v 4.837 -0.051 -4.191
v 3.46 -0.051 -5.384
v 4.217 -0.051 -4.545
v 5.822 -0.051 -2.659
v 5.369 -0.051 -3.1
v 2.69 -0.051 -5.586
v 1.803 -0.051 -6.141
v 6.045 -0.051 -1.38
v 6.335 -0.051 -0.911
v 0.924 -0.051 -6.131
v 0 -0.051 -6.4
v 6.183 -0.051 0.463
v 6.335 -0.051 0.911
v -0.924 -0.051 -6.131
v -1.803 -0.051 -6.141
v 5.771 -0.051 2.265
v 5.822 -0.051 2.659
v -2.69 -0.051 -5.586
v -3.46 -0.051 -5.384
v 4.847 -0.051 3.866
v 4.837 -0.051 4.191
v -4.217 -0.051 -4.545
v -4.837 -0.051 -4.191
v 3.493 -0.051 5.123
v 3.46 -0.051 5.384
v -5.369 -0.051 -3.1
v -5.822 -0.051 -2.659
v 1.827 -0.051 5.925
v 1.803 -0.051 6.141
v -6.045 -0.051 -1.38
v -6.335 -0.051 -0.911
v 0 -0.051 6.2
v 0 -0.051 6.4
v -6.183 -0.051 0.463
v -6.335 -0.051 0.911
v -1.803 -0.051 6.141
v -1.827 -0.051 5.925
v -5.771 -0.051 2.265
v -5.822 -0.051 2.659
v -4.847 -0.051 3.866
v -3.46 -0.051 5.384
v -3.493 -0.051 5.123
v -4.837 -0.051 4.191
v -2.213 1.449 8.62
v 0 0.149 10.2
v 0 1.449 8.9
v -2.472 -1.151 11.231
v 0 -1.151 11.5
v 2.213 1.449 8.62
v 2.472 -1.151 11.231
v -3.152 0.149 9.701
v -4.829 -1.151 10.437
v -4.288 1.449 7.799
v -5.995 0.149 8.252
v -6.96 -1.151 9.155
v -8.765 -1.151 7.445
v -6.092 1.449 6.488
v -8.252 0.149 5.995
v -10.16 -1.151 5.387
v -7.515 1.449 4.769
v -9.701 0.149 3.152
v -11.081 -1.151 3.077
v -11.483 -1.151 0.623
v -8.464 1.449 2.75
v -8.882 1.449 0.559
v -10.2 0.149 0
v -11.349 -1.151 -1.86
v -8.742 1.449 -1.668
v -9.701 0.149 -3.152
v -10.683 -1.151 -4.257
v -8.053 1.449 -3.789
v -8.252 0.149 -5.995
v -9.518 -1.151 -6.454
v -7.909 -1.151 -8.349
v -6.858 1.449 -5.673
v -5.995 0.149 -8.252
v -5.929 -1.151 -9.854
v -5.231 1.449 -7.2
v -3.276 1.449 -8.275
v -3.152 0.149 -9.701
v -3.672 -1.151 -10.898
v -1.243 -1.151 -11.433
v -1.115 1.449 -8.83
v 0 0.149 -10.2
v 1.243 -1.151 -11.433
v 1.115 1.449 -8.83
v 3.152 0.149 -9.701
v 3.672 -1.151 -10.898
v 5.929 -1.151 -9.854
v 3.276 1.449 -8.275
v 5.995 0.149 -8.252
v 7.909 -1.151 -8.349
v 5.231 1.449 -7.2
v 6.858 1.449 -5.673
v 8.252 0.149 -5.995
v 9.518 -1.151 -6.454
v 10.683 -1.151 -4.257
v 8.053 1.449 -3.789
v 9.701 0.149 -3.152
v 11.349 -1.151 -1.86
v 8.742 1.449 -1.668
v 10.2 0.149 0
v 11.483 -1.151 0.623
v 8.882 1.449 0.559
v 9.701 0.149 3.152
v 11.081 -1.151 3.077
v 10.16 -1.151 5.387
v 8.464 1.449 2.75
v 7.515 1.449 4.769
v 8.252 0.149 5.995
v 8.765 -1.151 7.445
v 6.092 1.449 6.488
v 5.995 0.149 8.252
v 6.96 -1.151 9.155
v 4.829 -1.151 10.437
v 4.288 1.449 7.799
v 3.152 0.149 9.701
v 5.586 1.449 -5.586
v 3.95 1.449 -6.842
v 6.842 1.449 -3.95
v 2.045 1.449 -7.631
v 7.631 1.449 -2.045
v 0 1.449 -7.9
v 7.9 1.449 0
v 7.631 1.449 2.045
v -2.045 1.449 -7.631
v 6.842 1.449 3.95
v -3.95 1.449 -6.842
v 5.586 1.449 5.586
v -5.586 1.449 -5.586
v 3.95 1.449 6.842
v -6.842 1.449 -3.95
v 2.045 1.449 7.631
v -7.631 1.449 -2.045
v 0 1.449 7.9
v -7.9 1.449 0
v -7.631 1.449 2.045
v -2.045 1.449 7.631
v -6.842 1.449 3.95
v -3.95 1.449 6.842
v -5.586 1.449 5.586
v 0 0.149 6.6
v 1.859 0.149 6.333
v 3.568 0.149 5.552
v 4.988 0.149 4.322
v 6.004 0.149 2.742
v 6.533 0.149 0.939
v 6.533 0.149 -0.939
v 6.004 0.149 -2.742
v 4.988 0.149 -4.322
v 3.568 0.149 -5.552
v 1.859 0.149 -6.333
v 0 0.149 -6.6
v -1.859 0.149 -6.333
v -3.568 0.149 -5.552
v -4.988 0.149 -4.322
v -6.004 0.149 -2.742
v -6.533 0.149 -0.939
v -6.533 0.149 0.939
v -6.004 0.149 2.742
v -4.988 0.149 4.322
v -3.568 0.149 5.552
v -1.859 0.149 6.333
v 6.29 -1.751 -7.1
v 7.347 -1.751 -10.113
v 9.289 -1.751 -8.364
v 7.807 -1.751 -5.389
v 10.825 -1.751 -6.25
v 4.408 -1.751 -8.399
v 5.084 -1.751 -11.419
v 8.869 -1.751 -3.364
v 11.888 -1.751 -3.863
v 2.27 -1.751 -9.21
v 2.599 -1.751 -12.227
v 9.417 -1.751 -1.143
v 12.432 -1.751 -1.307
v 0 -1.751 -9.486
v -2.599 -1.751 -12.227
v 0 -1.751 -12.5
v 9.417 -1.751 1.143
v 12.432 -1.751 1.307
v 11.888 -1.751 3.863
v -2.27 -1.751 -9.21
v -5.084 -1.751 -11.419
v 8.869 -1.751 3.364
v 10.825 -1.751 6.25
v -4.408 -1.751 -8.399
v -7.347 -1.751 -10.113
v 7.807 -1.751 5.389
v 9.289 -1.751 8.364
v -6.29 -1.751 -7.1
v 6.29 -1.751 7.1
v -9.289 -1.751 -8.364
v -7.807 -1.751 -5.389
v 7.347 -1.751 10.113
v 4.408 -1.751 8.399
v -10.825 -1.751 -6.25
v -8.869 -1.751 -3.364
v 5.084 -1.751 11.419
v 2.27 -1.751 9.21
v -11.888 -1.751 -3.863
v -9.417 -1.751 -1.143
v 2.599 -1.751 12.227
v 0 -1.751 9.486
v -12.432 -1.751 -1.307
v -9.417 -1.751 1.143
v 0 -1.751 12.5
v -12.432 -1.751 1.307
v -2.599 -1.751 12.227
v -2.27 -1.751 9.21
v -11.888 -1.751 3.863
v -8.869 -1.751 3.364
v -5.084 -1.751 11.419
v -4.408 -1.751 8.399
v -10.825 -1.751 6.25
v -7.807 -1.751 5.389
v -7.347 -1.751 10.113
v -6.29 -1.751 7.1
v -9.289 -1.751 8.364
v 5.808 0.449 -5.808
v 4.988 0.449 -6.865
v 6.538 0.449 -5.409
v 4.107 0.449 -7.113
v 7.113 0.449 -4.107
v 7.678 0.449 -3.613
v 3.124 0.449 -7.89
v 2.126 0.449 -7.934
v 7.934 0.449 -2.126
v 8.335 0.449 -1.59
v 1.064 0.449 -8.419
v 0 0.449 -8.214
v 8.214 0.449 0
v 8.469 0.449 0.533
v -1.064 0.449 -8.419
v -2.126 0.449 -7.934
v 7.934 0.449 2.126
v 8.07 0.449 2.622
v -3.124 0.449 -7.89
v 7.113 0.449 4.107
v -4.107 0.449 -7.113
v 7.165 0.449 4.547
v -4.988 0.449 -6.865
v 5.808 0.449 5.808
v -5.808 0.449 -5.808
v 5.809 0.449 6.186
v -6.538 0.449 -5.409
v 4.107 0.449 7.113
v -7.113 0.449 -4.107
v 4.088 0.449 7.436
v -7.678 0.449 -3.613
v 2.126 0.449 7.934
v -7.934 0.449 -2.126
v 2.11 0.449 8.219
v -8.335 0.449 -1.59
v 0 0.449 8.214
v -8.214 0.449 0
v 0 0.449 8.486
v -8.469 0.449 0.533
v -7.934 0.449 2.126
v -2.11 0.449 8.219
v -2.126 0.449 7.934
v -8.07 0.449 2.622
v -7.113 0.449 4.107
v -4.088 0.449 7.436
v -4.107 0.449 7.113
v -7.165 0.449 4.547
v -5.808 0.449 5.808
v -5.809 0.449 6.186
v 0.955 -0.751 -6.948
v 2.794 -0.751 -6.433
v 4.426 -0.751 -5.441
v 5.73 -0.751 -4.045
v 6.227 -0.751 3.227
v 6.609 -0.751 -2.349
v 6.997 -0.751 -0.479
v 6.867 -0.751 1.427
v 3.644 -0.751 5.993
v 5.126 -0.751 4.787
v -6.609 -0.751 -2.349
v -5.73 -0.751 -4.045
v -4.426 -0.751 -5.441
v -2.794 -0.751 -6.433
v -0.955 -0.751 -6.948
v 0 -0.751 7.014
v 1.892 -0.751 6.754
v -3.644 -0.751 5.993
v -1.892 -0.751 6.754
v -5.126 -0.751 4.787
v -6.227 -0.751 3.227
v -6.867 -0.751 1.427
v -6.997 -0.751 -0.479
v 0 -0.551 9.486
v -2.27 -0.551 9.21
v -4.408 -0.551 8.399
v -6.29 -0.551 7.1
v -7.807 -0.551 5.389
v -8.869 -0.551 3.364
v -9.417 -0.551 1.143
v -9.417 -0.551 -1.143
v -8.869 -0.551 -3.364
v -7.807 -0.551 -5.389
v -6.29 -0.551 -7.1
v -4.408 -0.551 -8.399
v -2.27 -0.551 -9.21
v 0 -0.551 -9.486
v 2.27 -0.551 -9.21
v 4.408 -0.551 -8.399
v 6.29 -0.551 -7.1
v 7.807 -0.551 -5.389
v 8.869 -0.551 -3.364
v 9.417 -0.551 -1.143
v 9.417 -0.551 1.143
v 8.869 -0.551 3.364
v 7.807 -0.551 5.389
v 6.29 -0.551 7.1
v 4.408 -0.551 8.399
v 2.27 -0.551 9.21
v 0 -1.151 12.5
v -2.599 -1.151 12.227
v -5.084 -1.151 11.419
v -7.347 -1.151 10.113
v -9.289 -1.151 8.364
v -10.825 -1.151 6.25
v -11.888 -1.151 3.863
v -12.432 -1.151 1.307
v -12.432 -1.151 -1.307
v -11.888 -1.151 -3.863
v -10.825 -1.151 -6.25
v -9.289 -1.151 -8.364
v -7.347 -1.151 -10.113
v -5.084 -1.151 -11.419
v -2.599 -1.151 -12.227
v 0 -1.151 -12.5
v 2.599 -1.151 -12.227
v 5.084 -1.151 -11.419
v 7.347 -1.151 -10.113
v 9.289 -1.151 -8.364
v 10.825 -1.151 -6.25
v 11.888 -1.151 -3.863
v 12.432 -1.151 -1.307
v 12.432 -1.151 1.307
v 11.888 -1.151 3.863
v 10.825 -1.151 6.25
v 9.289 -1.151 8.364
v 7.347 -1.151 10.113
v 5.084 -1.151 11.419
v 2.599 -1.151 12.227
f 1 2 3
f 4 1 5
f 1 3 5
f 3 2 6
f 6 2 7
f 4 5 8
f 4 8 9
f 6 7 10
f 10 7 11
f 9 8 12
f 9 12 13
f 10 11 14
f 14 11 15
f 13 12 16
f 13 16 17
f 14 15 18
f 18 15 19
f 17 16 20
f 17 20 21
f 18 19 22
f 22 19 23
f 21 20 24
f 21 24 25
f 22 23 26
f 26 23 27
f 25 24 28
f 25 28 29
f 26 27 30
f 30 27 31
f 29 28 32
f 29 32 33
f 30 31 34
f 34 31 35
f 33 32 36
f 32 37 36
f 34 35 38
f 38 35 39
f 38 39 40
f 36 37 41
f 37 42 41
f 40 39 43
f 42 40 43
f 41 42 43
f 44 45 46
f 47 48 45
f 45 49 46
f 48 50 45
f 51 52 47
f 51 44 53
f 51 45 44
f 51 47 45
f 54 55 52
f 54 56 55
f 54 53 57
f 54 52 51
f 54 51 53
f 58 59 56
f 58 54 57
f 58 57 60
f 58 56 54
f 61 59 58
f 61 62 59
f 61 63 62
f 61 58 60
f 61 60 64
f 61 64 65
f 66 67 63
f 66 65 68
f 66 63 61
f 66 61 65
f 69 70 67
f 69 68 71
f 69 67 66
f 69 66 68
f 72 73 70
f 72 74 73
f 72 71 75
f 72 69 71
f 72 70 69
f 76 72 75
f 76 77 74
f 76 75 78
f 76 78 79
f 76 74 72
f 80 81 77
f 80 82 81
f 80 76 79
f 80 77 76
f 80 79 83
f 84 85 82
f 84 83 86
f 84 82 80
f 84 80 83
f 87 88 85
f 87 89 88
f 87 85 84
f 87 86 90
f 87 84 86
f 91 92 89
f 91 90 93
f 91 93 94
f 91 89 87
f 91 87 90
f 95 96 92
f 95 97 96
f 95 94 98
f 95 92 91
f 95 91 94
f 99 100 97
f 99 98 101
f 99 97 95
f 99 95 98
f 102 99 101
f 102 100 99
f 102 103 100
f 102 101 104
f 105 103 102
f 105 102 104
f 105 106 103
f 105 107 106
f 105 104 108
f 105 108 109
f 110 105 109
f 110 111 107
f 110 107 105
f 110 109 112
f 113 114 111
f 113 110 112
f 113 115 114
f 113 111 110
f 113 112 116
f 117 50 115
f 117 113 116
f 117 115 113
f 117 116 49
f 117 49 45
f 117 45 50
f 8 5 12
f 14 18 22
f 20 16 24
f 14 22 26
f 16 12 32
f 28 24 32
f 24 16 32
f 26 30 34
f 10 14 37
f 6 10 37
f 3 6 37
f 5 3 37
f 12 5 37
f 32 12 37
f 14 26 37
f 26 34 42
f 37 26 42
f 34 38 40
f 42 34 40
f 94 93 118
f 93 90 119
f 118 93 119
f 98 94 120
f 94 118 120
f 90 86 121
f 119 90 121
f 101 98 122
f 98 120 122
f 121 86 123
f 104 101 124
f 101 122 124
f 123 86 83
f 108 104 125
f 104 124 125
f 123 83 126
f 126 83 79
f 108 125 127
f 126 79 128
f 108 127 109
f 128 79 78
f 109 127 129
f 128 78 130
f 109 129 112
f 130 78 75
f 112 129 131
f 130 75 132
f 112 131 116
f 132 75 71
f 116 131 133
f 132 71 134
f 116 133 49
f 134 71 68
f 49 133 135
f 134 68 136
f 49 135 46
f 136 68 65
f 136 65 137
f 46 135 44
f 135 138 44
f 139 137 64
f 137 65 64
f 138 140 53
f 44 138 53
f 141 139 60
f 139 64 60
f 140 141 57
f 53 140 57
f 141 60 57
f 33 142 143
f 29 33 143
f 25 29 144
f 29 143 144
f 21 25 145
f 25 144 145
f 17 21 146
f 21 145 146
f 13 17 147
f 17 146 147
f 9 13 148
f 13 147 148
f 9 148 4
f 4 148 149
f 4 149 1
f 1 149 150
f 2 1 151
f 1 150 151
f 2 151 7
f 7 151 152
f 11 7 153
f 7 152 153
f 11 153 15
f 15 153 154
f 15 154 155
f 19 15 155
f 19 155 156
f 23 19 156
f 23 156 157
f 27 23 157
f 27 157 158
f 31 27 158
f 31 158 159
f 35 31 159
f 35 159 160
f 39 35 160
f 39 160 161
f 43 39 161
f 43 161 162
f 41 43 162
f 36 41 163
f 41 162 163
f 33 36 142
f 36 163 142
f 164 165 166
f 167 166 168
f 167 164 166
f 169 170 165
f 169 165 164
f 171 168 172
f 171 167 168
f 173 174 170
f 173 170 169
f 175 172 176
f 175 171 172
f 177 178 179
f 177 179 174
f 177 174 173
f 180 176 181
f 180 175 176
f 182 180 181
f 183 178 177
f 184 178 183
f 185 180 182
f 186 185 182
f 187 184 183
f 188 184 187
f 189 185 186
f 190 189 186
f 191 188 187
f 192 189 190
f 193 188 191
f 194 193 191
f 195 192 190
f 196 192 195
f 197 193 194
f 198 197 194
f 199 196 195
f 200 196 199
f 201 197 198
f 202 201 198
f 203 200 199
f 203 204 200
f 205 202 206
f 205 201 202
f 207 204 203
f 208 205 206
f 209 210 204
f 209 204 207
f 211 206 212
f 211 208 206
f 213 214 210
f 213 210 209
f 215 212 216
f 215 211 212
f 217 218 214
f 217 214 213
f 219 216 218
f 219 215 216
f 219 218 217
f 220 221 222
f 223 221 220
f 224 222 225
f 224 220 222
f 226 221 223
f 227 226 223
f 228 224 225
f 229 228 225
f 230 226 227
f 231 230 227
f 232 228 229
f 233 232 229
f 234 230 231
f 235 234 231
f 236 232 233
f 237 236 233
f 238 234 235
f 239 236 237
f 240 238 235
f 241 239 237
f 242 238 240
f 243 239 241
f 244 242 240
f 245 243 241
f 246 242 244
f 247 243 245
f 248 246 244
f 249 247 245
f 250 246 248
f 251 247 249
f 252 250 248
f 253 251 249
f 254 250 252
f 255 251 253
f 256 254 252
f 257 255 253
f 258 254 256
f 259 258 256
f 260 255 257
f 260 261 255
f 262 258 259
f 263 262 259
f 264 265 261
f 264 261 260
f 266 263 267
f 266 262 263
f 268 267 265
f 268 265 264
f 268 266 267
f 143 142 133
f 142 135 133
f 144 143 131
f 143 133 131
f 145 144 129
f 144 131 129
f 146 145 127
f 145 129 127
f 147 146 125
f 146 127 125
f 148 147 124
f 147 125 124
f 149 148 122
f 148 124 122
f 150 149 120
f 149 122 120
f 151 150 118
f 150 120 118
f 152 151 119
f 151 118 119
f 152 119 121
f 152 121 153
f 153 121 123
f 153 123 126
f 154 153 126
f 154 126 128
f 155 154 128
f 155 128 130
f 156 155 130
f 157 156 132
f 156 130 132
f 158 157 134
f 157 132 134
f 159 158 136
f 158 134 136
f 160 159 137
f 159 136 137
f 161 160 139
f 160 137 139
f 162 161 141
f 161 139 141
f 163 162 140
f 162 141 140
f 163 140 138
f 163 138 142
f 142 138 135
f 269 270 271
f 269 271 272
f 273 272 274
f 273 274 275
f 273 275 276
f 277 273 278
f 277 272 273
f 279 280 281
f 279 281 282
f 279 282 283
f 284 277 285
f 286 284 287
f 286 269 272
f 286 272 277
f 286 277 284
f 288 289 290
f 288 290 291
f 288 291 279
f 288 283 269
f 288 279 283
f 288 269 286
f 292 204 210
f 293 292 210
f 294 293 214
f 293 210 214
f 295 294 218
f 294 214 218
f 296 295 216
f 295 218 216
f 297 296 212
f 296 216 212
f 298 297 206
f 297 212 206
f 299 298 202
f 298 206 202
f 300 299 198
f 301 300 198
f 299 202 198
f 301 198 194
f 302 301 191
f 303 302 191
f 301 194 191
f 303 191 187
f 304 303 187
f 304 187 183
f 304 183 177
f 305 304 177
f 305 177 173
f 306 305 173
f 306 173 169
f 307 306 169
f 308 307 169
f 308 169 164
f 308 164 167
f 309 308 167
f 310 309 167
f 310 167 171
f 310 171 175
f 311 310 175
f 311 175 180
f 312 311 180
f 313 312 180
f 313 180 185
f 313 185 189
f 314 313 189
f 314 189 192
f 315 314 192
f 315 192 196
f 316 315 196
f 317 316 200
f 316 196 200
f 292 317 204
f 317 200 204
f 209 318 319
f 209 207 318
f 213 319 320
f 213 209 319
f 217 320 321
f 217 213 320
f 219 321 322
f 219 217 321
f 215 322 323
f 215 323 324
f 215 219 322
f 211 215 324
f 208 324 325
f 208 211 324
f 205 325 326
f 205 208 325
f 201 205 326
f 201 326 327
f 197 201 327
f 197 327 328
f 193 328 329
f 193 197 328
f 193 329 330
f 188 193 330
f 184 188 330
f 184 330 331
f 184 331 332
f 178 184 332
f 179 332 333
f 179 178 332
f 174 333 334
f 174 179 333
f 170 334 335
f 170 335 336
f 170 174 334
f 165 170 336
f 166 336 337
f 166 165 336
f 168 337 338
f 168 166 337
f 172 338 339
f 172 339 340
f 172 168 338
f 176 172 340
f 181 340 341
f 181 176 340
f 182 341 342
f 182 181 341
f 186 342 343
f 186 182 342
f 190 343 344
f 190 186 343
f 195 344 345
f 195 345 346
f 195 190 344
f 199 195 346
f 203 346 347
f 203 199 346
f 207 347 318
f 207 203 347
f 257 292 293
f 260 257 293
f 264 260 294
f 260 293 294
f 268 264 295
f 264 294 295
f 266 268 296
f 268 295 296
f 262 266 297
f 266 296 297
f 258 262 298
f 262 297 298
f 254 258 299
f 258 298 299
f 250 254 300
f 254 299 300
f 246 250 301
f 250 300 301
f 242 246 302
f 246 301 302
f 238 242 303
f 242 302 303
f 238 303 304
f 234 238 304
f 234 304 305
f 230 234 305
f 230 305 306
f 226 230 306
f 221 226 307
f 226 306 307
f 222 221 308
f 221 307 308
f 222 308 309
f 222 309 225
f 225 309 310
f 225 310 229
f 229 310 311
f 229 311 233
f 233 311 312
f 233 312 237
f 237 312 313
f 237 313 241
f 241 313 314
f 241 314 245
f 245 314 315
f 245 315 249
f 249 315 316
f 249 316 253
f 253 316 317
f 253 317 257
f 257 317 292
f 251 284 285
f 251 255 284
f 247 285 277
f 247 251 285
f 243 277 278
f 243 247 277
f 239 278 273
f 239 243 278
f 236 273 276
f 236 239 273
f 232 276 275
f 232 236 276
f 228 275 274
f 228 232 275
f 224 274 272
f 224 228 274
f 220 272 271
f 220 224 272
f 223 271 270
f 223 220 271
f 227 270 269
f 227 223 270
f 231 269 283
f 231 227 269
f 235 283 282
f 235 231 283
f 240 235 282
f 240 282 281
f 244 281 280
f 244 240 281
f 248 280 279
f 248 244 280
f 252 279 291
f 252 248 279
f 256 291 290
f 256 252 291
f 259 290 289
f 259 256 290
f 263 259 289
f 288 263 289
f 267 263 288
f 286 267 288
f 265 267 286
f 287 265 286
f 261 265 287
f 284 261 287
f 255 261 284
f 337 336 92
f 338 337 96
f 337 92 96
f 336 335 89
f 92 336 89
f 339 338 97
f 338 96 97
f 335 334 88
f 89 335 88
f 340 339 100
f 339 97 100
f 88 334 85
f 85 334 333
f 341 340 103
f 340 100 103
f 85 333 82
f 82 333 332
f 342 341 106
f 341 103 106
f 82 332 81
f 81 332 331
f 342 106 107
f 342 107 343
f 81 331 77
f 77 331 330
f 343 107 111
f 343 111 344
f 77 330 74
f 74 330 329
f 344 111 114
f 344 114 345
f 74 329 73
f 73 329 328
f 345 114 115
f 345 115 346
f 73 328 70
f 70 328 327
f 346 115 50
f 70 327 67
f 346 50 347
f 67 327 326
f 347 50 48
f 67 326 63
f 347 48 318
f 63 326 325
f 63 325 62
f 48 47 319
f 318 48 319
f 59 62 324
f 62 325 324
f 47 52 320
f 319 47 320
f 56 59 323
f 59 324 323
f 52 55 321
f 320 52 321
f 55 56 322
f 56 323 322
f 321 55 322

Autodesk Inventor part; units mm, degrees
ref_plane "YZ Plane" through (0, 0, 0) normal (1, 0, 0) x (0, 1, 0)
ref_plane "XZ Plane" through (0, 0, 0) normal (0, 1, 0) x (-1, 0, 0)
ref_plane "XY Plane" through (0, 0, 0) normal (0, 0, 1) x (1, 0, 0)
sketch "Skizze1" plane through (0, 0, 0) normal (1, 0, 0) x (0, 1, 0)
  line L0 (3, 8.0893) -> (5.1212, 8.0893) construction
  line L1 (-0.0509, -6.2) -> (0.0741, -6.2) construction
  line L2 (0.0741, -6.2) -> (0.0741, 6.2) construction
  line L3 (0.0741, 6.2) -> (-0.0509, 6.2) construction
  line L4 (-0.0509, 6.2) -> (-0.0509, -6.2) construction
  line L5 (-0.0509, -6.2) -> (0.0741, 6.2) construction
  line L6 (0.0741, -6.2) -> (-0.0509, 6.2) construction
  line L7 (-0.0509, 6.2) -> (-0.0509, 0)
  line L8 (-0.0509, 0) -> (-0.7509, 0)
  line L9 (-0.7509, 0) -> (-0.7509, 7.0138)
  line L10 (-0.7509, 7.0138) -> (0.4491, 8.2138)
  line L11 (0.4491, 8.2138) -> (0.4491, 8.4858)
  line L12 (-0.0509, 6.2) -> (-0.0509, 6.4)
  line L13 (-0.0509, 6.4) -> (1.4491, 7.9)
  line L14 (1.4491, 7.9) -> (1.4491, 8.9)
  line L15 (1.4491, 8.9) -> (-1.1509, 11.5)
  line L16 (-1.7509, 12.5) -> (-1.7509, 9.4858)
  line L17 (0.4491, 8.4858) -> (-0.5509, 9.4858)
  line L18 (-0.5509, 9.4858) -> (-1.7509, 9.4858)
  line L19 (-1.1509, 11.5) -> (-1.1509, 12.5)
  line L20 (-1.1509, 12.5) -> (-1.7509, 12.5)
  line L21 (1.4491, 8.9) -> (1.4491, -8.9) projected
  line L22 (-1.1509, 11.5) -> (1.4491, 8.9)
  line L23 (1.4491, 7.9) -> (0.1491, 6.6)
  point P0 (0.0116, 0)
  point P1 (0.0116, 0)
  dimension "d14" = 0.125
  dimension "d16" = 0.7
  dimension "d18" = 135
  dimension "d20" = 0.2
  dimension "d27" = 135
  dimension "d28" = 1
  dimension "d29" = 1.2
  dimension "d30" = 1
  dimension "d31" = 1
  dimension "d34" = 1
  dimension "d36" = 0.6
  dimension "d37" = 12.5
  dimension "d39" = 1
revolve "Umdrehung1" add sketch "Skizze1" angle 360 about axis through (0, -0.0509, 0) along (0, -1, 0)
properties part number "50_ETL_Membrane_v0"
